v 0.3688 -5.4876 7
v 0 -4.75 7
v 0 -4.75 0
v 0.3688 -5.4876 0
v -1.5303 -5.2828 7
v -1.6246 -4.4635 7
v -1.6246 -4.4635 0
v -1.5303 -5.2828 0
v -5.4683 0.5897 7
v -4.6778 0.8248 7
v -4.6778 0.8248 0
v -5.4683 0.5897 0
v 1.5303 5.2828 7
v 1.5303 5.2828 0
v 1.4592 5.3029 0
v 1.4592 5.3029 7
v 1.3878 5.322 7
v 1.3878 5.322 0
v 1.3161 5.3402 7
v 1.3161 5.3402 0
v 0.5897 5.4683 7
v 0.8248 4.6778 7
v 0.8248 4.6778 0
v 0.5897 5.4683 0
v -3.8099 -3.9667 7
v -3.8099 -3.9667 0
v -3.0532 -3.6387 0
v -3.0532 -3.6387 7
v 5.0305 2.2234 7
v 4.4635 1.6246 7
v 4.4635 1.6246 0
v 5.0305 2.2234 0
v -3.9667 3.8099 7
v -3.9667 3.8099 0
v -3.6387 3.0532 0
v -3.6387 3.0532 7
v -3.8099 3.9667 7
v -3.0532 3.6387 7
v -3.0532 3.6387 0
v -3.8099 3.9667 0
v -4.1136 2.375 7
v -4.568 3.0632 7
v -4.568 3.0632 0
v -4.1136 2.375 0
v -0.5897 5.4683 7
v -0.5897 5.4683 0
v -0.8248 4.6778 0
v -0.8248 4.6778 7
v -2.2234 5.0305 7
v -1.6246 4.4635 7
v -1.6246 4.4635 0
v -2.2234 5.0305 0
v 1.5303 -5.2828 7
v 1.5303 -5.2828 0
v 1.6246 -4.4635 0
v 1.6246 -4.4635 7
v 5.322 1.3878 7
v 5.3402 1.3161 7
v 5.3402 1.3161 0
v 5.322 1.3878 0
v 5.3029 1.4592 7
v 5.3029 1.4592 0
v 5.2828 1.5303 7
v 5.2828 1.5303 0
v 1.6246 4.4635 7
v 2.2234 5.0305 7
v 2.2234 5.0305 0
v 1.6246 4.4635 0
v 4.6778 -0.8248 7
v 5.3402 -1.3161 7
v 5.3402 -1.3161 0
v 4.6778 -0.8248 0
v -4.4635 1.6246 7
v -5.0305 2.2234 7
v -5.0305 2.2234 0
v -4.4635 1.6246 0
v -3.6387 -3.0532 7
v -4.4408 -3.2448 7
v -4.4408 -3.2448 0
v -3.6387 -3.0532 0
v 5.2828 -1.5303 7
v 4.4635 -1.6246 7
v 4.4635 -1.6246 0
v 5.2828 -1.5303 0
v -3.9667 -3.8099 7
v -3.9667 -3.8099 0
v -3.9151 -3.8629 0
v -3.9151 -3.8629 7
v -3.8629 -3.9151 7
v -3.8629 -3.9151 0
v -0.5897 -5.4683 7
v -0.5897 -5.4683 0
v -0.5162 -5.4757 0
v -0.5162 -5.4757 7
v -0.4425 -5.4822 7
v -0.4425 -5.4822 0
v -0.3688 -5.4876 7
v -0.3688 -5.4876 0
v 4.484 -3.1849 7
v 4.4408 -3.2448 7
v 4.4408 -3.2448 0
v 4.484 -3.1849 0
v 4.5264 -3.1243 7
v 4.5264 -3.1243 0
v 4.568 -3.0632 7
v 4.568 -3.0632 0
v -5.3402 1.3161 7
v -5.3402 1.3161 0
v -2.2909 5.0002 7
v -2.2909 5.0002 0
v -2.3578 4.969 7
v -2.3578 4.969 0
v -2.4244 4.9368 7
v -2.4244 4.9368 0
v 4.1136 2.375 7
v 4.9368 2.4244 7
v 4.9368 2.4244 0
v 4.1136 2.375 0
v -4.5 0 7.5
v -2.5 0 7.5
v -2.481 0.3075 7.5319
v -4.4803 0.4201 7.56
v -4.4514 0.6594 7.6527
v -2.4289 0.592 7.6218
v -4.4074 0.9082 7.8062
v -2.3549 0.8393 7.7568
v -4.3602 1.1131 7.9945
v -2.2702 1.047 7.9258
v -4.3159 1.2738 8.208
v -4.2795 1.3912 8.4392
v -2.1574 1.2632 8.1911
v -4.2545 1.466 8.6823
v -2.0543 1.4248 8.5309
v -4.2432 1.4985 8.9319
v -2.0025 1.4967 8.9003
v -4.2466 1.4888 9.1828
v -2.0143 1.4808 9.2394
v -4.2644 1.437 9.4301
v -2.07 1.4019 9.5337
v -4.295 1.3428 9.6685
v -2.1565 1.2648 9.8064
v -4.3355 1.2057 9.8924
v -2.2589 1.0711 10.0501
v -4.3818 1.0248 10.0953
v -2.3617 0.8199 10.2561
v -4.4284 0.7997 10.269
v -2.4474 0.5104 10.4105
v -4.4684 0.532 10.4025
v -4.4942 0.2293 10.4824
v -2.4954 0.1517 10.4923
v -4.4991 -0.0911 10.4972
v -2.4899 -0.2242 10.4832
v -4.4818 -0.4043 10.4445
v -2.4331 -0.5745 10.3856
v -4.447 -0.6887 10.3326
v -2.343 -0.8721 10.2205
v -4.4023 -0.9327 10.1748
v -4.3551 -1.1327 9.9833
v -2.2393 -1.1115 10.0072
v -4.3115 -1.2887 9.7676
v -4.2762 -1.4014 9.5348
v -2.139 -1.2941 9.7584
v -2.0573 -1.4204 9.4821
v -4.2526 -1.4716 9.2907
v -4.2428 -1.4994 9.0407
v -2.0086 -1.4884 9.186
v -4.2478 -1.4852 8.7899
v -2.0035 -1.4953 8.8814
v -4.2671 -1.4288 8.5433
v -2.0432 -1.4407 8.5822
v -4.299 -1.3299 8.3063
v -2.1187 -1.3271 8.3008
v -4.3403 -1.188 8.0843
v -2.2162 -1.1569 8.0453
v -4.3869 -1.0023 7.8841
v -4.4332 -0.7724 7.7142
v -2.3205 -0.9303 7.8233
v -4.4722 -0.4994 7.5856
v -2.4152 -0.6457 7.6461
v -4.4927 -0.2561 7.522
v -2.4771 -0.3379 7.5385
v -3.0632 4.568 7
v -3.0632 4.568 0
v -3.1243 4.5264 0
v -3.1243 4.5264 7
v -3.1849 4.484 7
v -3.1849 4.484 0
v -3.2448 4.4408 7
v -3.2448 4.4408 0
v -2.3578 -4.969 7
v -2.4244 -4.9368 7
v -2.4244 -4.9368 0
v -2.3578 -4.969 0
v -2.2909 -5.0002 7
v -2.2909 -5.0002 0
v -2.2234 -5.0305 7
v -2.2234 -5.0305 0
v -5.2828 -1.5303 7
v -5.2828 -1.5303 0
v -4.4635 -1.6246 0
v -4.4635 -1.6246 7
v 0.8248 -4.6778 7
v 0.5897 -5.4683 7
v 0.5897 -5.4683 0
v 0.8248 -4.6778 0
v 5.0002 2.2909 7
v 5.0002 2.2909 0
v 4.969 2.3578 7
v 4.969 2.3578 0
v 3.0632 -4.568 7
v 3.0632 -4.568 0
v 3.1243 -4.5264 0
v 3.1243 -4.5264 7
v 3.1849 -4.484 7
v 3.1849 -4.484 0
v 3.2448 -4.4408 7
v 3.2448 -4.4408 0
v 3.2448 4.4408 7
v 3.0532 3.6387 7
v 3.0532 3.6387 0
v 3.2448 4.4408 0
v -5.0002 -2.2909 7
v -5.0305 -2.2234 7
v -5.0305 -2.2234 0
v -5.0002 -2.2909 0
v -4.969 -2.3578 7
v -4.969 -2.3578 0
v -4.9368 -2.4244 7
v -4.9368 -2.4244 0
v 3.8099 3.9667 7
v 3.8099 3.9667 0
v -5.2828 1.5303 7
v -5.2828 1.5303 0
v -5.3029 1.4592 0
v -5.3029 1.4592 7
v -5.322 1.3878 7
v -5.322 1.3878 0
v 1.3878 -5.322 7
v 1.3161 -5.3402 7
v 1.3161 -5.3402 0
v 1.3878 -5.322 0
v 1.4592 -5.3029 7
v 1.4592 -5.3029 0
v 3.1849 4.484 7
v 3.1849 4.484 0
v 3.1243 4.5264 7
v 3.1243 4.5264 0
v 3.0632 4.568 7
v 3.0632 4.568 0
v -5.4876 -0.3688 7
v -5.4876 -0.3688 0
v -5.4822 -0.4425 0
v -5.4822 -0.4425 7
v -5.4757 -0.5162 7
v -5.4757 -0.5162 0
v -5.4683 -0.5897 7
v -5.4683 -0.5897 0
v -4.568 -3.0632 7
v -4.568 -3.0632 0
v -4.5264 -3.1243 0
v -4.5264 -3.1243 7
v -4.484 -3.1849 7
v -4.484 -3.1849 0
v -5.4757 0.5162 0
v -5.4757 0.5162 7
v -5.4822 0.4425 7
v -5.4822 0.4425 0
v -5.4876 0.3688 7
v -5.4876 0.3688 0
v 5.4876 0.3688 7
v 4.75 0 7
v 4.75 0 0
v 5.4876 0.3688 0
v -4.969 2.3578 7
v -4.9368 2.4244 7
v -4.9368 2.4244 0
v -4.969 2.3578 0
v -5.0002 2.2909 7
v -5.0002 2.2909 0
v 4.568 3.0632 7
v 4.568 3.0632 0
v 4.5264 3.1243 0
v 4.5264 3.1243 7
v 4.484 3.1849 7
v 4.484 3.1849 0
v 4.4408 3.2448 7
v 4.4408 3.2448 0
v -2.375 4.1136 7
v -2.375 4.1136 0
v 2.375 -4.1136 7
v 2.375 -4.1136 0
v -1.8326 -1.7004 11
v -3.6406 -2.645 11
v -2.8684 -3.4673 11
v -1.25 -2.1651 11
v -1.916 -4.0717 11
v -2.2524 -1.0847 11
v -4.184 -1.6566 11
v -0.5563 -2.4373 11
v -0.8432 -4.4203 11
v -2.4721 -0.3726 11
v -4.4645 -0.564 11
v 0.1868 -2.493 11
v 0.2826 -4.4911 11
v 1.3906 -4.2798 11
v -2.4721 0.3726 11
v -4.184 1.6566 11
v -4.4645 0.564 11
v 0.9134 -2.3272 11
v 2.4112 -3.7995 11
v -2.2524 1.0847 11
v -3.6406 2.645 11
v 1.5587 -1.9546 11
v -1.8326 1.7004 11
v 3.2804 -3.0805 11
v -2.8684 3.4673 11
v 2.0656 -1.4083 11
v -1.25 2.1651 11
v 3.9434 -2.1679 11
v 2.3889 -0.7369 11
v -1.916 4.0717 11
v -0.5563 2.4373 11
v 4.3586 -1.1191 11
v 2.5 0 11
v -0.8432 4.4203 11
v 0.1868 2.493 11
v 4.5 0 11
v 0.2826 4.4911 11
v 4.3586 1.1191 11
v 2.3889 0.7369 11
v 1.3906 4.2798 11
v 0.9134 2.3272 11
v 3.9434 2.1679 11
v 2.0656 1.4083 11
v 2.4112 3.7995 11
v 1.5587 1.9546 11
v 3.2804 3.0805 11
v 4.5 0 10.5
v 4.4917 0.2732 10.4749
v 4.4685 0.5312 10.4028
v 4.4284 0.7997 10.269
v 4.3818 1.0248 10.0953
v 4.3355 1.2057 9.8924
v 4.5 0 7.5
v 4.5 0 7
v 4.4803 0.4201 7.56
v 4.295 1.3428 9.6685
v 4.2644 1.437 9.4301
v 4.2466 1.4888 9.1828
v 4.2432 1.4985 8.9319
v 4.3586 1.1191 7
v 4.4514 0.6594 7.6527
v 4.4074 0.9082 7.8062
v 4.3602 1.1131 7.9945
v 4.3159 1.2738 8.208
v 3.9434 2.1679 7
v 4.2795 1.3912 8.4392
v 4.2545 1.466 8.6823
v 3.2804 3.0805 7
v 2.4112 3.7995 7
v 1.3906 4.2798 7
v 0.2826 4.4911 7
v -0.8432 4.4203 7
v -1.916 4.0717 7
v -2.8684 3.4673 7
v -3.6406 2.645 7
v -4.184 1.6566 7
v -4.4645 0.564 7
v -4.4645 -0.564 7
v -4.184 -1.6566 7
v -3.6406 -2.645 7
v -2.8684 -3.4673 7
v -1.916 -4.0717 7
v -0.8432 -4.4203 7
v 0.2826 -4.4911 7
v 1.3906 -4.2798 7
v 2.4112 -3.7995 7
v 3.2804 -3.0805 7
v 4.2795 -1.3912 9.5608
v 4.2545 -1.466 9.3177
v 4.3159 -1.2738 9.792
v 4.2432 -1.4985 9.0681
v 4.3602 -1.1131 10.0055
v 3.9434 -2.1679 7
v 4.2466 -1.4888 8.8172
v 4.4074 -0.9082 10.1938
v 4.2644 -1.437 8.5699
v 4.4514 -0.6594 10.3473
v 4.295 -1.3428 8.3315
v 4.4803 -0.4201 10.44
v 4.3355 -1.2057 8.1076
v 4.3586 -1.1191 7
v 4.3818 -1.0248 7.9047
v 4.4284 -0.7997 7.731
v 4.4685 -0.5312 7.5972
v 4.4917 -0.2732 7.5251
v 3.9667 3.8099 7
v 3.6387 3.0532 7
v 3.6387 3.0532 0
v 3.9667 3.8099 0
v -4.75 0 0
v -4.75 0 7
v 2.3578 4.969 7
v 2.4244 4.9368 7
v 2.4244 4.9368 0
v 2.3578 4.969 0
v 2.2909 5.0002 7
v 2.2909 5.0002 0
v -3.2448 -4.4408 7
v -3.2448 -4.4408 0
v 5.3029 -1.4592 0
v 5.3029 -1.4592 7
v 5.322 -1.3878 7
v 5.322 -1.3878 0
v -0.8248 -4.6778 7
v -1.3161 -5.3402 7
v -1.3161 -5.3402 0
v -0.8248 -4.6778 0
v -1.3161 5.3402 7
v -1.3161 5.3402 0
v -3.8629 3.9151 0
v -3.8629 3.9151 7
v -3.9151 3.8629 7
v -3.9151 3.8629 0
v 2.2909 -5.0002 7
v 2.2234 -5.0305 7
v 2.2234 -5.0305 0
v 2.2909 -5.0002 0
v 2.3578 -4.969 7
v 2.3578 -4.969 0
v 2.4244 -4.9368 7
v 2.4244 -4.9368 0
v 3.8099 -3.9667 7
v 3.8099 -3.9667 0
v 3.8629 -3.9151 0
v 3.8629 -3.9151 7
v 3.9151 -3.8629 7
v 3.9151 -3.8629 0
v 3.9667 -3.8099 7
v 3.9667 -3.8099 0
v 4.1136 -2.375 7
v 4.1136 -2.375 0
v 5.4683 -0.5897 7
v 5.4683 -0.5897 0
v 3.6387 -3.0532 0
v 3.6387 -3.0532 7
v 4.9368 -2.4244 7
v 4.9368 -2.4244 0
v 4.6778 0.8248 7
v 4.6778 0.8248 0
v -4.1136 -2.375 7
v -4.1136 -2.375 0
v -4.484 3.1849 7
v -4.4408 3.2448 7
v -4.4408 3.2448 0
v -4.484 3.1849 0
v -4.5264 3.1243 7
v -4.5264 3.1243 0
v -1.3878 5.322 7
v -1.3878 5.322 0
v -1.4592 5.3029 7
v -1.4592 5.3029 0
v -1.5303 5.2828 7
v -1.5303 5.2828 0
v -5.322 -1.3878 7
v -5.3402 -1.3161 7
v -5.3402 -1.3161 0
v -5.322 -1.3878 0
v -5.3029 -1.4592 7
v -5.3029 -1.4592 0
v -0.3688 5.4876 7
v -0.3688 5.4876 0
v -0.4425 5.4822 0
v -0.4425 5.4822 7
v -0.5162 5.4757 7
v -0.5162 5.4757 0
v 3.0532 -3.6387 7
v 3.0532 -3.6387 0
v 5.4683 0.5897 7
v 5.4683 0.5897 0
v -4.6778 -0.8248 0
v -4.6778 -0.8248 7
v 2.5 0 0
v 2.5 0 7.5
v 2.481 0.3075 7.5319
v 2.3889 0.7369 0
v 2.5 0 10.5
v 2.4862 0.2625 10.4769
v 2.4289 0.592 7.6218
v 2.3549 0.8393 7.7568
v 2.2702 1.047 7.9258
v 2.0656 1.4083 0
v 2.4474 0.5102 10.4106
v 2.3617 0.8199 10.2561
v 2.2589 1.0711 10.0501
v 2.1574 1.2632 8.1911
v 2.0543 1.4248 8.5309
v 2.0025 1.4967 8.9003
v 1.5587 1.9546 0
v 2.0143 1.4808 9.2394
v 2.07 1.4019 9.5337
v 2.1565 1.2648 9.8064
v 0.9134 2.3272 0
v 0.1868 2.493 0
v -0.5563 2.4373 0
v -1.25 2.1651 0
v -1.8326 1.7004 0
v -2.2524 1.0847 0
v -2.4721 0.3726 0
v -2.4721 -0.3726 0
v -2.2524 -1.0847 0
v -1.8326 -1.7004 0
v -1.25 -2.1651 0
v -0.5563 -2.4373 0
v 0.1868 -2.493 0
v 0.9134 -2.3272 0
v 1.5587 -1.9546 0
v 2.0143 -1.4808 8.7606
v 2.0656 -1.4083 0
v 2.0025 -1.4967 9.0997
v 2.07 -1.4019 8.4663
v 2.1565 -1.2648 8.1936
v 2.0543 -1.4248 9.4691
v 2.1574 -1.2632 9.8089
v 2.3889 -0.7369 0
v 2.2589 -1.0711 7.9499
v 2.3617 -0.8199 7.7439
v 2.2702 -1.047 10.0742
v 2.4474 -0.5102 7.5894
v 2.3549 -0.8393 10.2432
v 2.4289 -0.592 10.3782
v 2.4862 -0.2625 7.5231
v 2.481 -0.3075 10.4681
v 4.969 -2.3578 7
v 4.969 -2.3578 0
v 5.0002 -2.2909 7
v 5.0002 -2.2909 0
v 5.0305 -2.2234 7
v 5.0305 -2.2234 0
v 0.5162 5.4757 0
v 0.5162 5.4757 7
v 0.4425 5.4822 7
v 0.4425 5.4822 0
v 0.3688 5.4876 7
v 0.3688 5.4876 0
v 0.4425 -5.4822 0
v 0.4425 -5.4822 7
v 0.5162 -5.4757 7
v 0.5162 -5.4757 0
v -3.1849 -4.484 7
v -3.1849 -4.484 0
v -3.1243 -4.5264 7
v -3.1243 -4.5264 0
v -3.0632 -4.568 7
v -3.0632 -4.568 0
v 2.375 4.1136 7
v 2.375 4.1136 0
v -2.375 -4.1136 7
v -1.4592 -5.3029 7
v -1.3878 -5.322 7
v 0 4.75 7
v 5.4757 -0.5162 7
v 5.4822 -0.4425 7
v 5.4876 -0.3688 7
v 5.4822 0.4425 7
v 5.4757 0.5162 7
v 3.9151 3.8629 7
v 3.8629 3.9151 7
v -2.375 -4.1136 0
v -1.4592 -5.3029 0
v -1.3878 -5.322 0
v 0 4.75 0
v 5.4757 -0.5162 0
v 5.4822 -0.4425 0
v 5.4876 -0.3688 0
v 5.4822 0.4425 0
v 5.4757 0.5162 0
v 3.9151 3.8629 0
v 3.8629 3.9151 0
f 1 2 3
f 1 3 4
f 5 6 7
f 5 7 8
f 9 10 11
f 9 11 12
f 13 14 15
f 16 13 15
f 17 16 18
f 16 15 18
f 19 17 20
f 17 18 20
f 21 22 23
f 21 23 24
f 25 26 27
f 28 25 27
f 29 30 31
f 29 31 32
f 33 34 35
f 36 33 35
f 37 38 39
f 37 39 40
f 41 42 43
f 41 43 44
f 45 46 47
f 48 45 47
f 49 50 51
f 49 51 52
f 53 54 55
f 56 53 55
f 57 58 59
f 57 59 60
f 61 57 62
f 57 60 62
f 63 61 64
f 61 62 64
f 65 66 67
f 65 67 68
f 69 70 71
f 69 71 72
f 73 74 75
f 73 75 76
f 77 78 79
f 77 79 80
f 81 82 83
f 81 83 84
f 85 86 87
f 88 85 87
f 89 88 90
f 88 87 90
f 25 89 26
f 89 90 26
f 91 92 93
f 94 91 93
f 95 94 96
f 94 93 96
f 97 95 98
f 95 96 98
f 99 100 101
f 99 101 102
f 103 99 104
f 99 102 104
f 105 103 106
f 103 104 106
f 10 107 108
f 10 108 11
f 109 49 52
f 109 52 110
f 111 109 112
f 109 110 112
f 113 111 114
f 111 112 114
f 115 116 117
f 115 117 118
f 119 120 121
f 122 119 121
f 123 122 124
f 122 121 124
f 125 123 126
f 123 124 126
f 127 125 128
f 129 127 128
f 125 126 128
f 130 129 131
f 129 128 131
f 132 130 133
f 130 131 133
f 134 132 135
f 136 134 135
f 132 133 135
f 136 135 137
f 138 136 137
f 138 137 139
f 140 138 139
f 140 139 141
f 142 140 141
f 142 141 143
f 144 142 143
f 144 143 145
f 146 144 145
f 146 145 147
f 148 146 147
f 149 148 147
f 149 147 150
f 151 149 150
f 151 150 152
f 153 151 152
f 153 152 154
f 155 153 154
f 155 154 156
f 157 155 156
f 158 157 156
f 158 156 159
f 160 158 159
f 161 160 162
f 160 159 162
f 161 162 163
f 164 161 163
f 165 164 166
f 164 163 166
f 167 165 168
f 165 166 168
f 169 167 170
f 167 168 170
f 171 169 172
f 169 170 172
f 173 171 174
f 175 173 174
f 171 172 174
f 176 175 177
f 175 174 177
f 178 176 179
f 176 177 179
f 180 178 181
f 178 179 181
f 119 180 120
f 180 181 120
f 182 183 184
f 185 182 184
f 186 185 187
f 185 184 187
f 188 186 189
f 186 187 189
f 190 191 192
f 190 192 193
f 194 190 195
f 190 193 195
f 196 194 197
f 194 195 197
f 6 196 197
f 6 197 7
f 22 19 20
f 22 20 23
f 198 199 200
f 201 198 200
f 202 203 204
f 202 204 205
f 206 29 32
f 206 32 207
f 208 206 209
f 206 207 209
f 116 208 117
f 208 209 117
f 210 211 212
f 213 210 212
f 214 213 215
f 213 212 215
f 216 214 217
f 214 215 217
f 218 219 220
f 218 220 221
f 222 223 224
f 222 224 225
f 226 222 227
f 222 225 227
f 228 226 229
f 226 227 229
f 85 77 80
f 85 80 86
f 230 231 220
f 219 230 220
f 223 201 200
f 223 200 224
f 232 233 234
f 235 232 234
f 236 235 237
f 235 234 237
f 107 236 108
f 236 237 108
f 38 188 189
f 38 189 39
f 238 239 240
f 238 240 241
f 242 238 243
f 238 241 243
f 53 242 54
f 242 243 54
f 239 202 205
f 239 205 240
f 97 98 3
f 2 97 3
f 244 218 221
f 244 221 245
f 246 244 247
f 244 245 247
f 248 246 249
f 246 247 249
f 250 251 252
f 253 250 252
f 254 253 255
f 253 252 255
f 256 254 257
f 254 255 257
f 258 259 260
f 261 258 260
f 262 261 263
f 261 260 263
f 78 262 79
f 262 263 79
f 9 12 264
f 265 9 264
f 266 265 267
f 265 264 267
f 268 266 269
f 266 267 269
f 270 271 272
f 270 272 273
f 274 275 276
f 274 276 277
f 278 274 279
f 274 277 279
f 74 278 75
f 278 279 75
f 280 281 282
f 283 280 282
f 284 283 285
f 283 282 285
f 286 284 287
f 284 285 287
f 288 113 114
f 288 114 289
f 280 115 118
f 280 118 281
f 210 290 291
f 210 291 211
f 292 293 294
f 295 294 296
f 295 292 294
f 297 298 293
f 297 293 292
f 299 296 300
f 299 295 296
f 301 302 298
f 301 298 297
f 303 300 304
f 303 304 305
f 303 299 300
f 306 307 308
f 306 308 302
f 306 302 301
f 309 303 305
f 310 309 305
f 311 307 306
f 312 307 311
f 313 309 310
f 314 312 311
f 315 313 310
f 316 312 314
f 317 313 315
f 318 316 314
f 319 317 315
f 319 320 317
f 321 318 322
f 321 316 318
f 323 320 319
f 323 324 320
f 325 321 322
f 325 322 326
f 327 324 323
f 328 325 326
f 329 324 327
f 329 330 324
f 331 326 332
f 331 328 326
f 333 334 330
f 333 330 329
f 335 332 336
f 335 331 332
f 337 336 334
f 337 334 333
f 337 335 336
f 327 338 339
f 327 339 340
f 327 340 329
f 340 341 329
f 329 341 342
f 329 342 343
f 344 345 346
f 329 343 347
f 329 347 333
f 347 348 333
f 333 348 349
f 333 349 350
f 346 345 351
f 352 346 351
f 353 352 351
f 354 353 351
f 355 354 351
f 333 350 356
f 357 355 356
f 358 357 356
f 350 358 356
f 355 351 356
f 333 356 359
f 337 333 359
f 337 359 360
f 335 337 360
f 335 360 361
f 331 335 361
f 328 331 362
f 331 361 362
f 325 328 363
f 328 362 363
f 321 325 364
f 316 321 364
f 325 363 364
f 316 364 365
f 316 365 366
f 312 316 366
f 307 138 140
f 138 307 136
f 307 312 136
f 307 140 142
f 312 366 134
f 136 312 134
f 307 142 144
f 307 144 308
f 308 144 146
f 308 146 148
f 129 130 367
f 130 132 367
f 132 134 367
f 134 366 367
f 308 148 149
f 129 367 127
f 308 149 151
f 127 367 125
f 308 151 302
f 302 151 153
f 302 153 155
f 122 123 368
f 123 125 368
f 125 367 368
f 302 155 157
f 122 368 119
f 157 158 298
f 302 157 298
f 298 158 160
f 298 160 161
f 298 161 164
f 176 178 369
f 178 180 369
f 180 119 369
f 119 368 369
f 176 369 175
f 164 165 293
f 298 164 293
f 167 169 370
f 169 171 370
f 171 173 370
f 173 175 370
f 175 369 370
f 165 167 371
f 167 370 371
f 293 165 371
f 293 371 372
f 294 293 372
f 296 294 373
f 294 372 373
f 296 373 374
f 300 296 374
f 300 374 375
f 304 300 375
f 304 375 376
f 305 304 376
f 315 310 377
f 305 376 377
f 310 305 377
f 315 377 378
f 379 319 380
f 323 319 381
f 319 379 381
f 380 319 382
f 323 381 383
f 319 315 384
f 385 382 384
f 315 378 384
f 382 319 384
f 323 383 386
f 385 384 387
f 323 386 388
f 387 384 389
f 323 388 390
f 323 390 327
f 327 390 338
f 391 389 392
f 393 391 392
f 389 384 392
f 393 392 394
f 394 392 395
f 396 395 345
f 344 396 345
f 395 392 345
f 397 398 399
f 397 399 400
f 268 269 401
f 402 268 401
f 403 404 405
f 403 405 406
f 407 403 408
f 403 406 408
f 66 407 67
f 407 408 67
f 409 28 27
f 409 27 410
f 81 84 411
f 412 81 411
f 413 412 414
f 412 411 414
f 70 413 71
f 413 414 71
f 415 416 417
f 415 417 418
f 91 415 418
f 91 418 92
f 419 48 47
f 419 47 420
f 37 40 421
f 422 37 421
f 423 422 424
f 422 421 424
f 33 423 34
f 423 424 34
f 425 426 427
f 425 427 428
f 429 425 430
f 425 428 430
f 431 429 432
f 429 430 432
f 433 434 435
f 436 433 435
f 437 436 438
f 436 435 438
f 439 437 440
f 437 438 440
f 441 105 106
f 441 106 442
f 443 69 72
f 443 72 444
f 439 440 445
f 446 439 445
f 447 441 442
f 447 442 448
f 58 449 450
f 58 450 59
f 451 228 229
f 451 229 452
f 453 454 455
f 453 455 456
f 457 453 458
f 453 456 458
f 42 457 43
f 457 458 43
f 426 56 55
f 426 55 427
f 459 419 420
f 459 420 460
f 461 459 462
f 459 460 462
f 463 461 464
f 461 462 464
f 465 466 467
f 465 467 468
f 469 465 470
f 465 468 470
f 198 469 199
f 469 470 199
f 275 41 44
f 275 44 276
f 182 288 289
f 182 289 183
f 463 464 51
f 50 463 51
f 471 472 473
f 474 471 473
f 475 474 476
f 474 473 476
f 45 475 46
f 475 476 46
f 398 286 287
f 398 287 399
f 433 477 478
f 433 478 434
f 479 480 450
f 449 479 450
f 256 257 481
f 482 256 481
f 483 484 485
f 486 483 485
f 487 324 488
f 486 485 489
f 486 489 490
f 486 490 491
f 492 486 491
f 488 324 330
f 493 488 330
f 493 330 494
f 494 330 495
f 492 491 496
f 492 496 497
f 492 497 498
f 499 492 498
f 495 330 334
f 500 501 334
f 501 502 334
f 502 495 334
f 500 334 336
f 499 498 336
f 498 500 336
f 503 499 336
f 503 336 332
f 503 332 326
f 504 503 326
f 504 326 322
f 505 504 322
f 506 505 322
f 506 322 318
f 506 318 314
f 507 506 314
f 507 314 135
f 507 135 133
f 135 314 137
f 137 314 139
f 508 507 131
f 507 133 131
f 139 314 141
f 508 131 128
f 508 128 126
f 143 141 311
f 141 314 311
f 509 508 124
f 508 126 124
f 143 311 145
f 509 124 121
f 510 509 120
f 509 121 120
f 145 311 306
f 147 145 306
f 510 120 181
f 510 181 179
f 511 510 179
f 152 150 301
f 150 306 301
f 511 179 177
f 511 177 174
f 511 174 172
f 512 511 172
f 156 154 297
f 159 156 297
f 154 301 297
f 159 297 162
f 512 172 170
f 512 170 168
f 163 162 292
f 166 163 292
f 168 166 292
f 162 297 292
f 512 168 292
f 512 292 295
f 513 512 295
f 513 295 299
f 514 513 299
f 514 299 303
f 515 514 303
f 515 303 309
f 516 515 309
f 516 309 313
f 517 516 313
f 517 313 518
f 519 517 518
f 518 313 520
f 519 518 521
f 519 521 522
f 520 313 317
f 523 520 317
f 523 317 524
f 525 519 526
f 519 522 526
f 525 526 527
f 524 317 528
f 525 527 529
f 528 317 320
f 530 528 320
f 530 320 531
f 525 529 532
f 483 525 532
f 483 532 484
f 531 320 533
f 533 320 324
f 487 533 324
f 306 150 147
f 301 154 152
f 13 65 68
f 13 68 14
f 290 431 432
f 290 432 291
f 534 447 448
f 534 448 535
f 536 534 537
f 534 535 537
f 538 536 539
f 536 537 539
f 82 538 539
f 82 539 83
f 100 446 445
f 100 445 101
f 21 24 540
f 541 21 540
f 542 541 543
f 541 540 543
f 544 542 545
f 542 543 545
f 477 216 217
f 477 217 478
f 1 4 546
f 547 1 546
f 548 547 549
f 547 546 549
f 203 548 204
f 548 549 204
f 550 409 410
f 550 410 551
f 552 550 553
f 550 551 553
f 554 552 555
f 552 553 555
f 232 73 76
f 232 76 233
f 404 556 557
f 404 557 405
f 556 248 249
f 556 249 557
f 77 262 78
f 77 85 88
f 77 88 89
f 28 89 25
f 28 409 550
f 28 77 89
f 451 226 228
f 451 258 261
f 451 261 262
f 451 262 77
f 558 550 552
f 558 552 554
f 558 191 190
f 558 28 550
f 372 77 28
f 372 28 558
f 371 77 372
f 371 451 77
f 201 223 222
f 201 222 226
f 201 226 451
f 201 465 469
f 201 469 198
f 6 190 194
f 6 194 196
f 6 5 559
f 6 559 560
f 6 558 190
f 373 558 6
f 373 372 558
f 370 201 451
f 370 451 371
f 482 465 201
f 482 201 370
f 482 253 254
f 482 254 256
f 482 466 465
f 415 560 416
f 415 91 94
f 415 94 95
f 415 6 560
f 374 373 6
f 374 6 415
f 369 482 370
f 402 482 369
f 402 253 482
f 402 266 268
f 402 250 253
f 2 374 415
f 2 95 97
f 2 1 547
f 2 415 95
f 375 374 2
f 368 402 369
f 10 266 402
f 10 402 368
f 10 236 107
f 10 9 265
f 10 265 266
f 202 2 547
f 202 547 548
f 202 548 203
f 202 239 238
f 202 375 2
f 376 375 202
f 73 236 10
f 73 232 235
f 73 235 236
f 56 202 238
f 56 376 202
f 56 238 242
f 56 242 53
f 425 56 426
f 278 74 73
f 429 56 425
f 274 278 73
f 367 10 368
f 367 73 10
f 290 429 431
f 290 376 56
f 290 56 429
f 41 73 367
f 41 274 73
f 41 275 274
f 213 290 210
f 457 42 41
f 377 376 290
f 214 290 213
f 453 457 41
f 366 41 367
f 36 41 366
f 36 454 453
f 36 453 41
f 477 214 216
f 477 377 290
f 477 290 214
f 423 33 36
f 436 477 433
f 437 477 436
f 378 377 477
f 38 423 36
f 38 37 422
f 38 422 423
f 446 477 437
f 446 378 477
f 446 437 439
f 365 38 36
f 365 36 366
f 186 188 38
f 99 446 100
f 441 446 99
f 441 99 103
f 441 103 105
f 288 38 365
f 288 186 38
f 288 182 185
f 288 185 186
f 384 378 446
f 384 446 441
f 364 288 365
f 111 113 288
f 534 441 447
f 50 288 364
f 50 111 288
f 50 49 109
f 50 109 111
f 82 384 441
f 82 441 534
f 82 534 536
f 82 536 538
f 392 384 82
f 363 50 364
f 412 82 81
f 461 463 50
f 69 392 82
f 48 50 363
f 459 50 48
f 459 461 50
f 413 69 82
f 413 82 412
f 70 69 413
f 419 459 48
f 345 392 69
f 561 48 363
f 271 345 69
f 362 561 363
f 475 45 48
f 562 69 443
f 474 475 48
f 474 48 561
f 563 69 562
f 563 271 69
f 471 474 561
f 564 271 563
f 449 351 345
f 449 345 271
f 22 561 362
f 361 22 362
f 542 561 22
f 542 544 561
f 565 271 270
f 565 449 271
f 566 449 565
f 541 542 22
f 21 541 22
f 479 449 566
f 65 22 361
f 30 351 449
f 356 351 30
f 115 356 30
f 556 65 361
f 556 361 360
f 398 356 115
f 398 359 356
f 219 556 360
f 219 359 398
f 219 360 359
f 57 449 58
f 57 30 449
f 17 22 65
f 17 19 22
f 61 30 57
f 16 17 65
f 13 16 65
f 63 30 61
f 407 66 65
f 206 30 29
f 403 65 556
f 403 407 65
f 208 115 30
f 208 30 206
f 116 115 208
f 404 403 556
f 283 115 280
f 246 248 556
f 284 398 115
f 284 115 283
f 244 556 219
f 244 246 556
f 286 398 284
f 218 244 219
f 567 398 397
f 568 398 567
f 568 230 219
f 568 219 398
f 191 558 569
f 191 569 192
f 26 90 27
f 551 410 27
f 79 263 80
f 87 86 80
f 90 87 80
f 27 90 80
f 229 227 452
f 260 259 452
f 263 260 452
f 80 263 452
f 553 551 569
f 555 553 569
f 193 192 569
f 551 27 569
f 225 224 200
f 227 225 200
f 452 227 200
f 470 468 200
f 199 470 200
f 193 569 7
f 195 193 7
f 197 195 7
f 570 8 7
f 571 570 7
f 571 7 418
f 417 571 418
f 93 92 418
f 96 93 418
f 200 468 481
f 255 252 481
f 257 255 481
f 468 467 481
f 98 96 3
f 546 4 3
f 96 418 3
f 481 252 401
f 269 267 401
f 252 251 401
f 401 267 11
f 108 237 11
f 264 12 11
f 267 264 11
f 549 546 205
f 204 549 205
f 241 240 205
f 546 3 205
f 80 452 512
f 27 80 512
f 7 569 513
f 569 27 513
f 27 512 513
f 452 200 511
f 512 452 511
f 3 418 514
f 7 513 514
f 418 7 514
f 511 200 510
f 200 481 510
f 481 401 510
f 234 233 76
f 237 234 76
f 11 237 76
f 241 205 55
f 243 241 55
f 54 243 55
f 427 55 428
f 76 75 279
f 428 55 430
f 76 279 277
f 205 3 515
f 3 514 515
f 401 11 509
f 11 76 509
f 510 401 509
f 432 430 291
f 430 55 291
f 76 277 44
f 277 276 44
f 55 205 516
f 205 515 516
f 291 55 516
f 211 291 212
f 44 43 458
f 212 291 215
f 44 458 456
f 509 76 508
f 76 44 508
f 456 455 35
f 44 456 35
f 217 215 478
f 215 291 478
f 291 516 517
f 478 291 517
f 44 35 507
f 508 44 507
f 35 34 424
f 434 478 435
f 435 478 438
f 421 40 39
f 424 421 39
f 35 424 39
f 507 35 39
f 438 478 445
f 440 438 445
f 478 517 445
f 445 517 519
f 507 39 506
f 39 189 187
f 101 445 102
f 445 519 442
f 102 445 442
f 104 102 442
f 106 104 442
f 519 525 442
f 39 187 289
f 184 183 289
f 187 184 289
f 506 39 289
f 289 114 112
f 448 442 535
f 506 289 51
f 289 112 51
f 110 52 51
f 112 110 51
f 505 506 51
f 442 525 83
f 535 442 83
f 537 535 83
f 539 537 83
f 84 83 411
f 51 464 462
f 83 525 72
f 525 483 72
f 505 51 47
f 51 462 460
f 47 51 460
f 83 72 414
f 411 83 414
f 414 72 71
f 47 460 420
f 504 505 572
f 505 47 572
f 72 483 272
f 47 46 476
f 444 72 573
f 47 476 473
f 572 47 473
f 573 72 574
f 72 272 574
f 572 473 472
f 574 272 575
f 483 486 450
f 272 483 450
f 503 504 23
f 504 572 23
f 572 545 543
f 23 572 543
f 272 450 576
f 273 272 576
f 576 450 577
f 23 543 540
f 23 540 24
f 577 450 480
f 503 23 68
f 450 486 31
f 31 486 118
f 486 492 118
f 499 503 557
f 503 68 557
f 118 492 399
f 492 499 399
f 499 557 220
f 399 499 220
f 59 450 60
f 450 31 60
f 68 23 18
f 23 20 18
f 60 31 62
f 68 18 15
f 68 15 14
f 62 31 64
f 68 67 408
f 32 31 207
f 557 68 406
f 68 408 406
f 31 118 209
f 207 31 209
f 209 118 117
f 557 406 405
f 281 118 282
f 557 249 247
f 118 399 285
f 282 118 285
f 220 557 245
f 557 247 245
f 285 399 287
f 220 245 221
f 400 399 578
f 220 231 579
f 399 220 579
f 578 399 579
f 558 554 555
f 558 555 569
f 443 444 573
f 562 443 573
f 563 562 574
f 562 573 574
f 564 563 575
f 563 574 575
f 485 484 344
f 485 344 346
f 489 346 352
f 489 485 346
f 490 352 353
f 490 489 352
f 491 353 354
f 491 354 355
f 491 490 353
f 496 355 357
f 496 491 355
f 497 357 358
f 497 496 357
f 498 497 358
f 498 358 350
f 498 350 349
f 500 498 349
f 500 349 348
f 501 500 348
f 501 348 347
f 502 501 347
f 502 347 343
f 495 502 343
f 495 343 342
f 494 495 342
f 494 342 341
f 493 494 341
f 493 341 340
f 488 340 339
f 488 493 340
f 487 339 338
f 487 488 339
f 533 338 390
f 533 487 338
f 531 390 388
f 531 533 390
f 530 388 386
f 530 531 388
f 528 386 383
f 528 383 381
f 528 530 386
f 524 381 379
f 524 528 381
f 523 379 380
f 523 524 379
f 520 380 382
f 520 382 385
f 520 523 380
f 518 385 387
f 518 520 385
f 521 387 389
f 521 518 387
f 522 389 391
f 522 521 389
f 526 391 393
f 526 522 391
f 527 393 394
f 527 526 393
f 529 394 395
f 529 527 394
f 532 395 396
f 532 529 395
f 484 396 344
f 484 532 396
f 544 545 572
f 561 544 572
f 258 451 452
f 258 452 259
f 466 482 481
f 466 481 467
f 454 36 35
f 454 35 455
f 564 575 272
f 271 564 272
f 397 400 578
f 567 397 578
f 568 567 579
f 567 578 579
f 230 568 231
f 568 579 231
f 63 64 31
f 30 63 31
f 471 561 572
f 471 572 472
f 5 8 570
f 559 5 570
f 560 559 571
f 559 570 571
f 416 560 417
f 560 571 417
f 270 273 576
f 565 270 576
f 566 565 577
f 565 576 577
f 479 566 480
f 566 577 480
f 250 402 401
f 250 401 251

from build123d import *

# Parameters (mm, degrees)
SKETCH1_R               = 5.5
BOSS_EXTRUDE1_DEPTH     = 7
CUT_EXTRUDE3_DEPTH      = 7
SKETCH3_R               = 4.5
BOSS_EXTRUDE2_DEPTH     = 4
SKETCH4_R               = 1.5
CUT_EXTRUDE4_DEPTH      = 6
CUT_EXTRUDE4_DEPTH_BACK = 6
SKETCH5_R               = 2.5
CUT_EXTRUDE5_DEPTH      = 12


with BuildPart() as part:
    # Sketch1 → Boss-Extrude1 (new body)
    with BuildSketch(Plane.XY):
        Circle(SKETCH1_R)
    extrude(amount=BOSS_EXTRUDE1_DEPTH)

    # Sketch2 → Cut-Extrude3 (cut)
    with BuildSketch(Plane.XY.offset(7)):
        Polygon((0, 4.75), (-0.5, 5.75), (0.5, 5.75), align=None)
        Polygon((0.824828844, 4.677836827), (0.506073145, 5.749468669), (1.490880898, 5.575820491), align=None)
        Polygon((1.624595681, 4.463539949), (1.496769514, 5.574242641), (2.436462135, 5.232222498), align=None)
        Polygon((2.375, 4.113620668), (2.441987298, 5.229646072), (3.308012702, 4.729646072), align=None)
        Polygon((3.053241146, 3.638711105), (3.313006534, 4.726149353), (4.079050977, 4.083361743), align=None)
        Polygon((3.638711105, 3.053241146), (4.083361743, 4.079050977), (4.726149353, 3.313006534), align=None)
        Polygon((4.113620668, 2.375), (4.729646072, 3.308012702), (5.229646072, 2.441987298), align=None)
        Polygon((4.463539949, 1.624595681), (5.232222498, 2.436462135), (5.574242641, 1.496769514), align=None)
        Polygon((4.677836827, 0.824828844), (5.575820491, 1.490880898), (5.749468669, 0.506073145), align=None)
        Polygon((4.75, 0), (5.75, 0.5), (5.75, -0.5), align=None)
        Polygon((4.677836827, -0.824828844), (5.749468669, -0.506073145), (5.575820491, -1.490880898), align=None)
        Polygon((4.463539949, -1.624595681), (5.574242641, -1.496769514), (5.232222498, -2.436462135), align=None)
        Polygon((4.113620668, -2.375), (5.229646072, -2.441987298), (4.729646072, -3.308012702), align=None)
        Polygon((3.638711105, -3.053241146), (4.726149353, -3.313006534), (4.083361743, -4.079050977), align=None)
        Polygon((3.053241146, -3.638711105), (4.079050977, -4.083361743), (3.313006534, -4.726149353), align=None)
        Polygon((2.375, -4.113620668), (3.308012702, -4.729646072), (2.441987298, -5.229646072), align=None)
        Polygon((1.624595681, -4.463539949), (2.436462135, -5.232222498), (1.496769514, -5.574242641), align=None)
        Polygon((0.824828844, -4.677836827), (1.490880898, -5.575820491), (0.506073145, -5.749468669), align=None)
        Polygon((0, -4.75), (0.5, -5.75), (-0.5, -5.75), align=None)
        Polygon((-0.824828844, -4.677836827), (-0.506073145, -5.749468669), (-1.490880898, -5.575820491), align=None)
        Polygon((-1.624595681, -4.463539949), (-1.496769514, -5.574242641), (-2.436462135, -5.232222498), align=None)
        Polygon((-2.375, -4.113620668), (-2.441987298, -5.229646072), (-3.308012702, -4.729646072), align=None)
        Polygon((-3.053241146, -3.638711105), (-3.313006534, -4.726149353), (-4.079050977, -4.083361743), align=None)
        Polygon((-3.638711105, -3.053241146), (-4.083361743, -4.079050977), (-4.726149353, -3.313006534), align=None)
        Polygon((-4.113620668, -2.375), (-4.729646072, -3.308012702), (-5.229646072, -2.441987298), align=None)
        Polygon((-4.463539949, -1.624595681), (-5.232222498, -2.436462135), (-5.574242641, -1.496769514), align=None)
        Polygon((-4.677836827, -0.824828844), (-5.575820491, -1.490880898), (-5.749468669, -0.506073145), align=None)
        Polygon((-4.75, 0), (-5.75, -0.5), (-5.75, 0.5), align=None)
        Polygon((-4.677836827, 0.824828844), (-5.749468669, 0.506073145), (-5.575820491, 1.490880898), align=None)
        Polygon((-4.463539949, 1.624595681), (-5.574242641, 1.496769514), (-5.232222498, 2.436462135), align=None)
        Polygon((-4.113620668, 2.375), (-5.229646072, 2.441987298), (-4.729646072, 3.308012702), align=None)
        Polygon((-3.638711105, 3.053241146), (-4.726149353, 3.313006534), (-4.083361743, 4.079050977), align=None)
        Polygon((-3.053241146, 3.638711105), (-4.079050977, 4.083361743), (-3.313006534, 4.726149353), align=None)
        Polygon((-2.375, 4.113620668), (-3.308012702, 4.729646072), (-2.441987298, 5.229646072), align=None)
        Polygon((-1.624595681, 4.463539949), (-2.436462135, 5.232222498), (-1.496769514, 5.574242641), align=None)
        Polygon((-0.824828844, 4.677836827), (-1.490880898, 5.575820491), (-0.506073145, 5.749468669), align=None)
    extrude(amount=-CUT_EXTRUDE3_DEPTH, mode=Mode.SUBTRACT)

    # Sketch3 → Boss-Extrude2 (add)
    with BuildSketch(Plane.XY.offset(7)):
        Circle(SKETCH3_R)
    extrude(amount=BOSS_EXTRUDE2_DEPTH)

    # Sketch4 → Cut-Extrude4 (cut, two sides)
    with BuildSketch(Plane(origin=(0, 0, 0), x_dir=(0, 0, -1), z_dir=(1, 0, 0))) as cut_extrude4_sk:
        with Locations((-9, 0)):
            Circle(SKETCH4_R)
    extrude(amount=CUT_EXTRUDE4_DEPTH, mode=Mode.SUBTRACT)
    extrude(cut_extrude4_sk.sketch, amount=-CUT_EXTRUDE4_DEPTH_BACK, mode=Mode.SUBTRACT)

    # Sketch5 → Cut-Extrude5 (cut)
    with BuildSketch(Plane.XY.offset(11)):
        Circle(SKETCH5_R)
    extrude(amount=-CUT_EXTRUDE5_DEPTH, mode=Mode.SUBTRACT)


solid = part.part
